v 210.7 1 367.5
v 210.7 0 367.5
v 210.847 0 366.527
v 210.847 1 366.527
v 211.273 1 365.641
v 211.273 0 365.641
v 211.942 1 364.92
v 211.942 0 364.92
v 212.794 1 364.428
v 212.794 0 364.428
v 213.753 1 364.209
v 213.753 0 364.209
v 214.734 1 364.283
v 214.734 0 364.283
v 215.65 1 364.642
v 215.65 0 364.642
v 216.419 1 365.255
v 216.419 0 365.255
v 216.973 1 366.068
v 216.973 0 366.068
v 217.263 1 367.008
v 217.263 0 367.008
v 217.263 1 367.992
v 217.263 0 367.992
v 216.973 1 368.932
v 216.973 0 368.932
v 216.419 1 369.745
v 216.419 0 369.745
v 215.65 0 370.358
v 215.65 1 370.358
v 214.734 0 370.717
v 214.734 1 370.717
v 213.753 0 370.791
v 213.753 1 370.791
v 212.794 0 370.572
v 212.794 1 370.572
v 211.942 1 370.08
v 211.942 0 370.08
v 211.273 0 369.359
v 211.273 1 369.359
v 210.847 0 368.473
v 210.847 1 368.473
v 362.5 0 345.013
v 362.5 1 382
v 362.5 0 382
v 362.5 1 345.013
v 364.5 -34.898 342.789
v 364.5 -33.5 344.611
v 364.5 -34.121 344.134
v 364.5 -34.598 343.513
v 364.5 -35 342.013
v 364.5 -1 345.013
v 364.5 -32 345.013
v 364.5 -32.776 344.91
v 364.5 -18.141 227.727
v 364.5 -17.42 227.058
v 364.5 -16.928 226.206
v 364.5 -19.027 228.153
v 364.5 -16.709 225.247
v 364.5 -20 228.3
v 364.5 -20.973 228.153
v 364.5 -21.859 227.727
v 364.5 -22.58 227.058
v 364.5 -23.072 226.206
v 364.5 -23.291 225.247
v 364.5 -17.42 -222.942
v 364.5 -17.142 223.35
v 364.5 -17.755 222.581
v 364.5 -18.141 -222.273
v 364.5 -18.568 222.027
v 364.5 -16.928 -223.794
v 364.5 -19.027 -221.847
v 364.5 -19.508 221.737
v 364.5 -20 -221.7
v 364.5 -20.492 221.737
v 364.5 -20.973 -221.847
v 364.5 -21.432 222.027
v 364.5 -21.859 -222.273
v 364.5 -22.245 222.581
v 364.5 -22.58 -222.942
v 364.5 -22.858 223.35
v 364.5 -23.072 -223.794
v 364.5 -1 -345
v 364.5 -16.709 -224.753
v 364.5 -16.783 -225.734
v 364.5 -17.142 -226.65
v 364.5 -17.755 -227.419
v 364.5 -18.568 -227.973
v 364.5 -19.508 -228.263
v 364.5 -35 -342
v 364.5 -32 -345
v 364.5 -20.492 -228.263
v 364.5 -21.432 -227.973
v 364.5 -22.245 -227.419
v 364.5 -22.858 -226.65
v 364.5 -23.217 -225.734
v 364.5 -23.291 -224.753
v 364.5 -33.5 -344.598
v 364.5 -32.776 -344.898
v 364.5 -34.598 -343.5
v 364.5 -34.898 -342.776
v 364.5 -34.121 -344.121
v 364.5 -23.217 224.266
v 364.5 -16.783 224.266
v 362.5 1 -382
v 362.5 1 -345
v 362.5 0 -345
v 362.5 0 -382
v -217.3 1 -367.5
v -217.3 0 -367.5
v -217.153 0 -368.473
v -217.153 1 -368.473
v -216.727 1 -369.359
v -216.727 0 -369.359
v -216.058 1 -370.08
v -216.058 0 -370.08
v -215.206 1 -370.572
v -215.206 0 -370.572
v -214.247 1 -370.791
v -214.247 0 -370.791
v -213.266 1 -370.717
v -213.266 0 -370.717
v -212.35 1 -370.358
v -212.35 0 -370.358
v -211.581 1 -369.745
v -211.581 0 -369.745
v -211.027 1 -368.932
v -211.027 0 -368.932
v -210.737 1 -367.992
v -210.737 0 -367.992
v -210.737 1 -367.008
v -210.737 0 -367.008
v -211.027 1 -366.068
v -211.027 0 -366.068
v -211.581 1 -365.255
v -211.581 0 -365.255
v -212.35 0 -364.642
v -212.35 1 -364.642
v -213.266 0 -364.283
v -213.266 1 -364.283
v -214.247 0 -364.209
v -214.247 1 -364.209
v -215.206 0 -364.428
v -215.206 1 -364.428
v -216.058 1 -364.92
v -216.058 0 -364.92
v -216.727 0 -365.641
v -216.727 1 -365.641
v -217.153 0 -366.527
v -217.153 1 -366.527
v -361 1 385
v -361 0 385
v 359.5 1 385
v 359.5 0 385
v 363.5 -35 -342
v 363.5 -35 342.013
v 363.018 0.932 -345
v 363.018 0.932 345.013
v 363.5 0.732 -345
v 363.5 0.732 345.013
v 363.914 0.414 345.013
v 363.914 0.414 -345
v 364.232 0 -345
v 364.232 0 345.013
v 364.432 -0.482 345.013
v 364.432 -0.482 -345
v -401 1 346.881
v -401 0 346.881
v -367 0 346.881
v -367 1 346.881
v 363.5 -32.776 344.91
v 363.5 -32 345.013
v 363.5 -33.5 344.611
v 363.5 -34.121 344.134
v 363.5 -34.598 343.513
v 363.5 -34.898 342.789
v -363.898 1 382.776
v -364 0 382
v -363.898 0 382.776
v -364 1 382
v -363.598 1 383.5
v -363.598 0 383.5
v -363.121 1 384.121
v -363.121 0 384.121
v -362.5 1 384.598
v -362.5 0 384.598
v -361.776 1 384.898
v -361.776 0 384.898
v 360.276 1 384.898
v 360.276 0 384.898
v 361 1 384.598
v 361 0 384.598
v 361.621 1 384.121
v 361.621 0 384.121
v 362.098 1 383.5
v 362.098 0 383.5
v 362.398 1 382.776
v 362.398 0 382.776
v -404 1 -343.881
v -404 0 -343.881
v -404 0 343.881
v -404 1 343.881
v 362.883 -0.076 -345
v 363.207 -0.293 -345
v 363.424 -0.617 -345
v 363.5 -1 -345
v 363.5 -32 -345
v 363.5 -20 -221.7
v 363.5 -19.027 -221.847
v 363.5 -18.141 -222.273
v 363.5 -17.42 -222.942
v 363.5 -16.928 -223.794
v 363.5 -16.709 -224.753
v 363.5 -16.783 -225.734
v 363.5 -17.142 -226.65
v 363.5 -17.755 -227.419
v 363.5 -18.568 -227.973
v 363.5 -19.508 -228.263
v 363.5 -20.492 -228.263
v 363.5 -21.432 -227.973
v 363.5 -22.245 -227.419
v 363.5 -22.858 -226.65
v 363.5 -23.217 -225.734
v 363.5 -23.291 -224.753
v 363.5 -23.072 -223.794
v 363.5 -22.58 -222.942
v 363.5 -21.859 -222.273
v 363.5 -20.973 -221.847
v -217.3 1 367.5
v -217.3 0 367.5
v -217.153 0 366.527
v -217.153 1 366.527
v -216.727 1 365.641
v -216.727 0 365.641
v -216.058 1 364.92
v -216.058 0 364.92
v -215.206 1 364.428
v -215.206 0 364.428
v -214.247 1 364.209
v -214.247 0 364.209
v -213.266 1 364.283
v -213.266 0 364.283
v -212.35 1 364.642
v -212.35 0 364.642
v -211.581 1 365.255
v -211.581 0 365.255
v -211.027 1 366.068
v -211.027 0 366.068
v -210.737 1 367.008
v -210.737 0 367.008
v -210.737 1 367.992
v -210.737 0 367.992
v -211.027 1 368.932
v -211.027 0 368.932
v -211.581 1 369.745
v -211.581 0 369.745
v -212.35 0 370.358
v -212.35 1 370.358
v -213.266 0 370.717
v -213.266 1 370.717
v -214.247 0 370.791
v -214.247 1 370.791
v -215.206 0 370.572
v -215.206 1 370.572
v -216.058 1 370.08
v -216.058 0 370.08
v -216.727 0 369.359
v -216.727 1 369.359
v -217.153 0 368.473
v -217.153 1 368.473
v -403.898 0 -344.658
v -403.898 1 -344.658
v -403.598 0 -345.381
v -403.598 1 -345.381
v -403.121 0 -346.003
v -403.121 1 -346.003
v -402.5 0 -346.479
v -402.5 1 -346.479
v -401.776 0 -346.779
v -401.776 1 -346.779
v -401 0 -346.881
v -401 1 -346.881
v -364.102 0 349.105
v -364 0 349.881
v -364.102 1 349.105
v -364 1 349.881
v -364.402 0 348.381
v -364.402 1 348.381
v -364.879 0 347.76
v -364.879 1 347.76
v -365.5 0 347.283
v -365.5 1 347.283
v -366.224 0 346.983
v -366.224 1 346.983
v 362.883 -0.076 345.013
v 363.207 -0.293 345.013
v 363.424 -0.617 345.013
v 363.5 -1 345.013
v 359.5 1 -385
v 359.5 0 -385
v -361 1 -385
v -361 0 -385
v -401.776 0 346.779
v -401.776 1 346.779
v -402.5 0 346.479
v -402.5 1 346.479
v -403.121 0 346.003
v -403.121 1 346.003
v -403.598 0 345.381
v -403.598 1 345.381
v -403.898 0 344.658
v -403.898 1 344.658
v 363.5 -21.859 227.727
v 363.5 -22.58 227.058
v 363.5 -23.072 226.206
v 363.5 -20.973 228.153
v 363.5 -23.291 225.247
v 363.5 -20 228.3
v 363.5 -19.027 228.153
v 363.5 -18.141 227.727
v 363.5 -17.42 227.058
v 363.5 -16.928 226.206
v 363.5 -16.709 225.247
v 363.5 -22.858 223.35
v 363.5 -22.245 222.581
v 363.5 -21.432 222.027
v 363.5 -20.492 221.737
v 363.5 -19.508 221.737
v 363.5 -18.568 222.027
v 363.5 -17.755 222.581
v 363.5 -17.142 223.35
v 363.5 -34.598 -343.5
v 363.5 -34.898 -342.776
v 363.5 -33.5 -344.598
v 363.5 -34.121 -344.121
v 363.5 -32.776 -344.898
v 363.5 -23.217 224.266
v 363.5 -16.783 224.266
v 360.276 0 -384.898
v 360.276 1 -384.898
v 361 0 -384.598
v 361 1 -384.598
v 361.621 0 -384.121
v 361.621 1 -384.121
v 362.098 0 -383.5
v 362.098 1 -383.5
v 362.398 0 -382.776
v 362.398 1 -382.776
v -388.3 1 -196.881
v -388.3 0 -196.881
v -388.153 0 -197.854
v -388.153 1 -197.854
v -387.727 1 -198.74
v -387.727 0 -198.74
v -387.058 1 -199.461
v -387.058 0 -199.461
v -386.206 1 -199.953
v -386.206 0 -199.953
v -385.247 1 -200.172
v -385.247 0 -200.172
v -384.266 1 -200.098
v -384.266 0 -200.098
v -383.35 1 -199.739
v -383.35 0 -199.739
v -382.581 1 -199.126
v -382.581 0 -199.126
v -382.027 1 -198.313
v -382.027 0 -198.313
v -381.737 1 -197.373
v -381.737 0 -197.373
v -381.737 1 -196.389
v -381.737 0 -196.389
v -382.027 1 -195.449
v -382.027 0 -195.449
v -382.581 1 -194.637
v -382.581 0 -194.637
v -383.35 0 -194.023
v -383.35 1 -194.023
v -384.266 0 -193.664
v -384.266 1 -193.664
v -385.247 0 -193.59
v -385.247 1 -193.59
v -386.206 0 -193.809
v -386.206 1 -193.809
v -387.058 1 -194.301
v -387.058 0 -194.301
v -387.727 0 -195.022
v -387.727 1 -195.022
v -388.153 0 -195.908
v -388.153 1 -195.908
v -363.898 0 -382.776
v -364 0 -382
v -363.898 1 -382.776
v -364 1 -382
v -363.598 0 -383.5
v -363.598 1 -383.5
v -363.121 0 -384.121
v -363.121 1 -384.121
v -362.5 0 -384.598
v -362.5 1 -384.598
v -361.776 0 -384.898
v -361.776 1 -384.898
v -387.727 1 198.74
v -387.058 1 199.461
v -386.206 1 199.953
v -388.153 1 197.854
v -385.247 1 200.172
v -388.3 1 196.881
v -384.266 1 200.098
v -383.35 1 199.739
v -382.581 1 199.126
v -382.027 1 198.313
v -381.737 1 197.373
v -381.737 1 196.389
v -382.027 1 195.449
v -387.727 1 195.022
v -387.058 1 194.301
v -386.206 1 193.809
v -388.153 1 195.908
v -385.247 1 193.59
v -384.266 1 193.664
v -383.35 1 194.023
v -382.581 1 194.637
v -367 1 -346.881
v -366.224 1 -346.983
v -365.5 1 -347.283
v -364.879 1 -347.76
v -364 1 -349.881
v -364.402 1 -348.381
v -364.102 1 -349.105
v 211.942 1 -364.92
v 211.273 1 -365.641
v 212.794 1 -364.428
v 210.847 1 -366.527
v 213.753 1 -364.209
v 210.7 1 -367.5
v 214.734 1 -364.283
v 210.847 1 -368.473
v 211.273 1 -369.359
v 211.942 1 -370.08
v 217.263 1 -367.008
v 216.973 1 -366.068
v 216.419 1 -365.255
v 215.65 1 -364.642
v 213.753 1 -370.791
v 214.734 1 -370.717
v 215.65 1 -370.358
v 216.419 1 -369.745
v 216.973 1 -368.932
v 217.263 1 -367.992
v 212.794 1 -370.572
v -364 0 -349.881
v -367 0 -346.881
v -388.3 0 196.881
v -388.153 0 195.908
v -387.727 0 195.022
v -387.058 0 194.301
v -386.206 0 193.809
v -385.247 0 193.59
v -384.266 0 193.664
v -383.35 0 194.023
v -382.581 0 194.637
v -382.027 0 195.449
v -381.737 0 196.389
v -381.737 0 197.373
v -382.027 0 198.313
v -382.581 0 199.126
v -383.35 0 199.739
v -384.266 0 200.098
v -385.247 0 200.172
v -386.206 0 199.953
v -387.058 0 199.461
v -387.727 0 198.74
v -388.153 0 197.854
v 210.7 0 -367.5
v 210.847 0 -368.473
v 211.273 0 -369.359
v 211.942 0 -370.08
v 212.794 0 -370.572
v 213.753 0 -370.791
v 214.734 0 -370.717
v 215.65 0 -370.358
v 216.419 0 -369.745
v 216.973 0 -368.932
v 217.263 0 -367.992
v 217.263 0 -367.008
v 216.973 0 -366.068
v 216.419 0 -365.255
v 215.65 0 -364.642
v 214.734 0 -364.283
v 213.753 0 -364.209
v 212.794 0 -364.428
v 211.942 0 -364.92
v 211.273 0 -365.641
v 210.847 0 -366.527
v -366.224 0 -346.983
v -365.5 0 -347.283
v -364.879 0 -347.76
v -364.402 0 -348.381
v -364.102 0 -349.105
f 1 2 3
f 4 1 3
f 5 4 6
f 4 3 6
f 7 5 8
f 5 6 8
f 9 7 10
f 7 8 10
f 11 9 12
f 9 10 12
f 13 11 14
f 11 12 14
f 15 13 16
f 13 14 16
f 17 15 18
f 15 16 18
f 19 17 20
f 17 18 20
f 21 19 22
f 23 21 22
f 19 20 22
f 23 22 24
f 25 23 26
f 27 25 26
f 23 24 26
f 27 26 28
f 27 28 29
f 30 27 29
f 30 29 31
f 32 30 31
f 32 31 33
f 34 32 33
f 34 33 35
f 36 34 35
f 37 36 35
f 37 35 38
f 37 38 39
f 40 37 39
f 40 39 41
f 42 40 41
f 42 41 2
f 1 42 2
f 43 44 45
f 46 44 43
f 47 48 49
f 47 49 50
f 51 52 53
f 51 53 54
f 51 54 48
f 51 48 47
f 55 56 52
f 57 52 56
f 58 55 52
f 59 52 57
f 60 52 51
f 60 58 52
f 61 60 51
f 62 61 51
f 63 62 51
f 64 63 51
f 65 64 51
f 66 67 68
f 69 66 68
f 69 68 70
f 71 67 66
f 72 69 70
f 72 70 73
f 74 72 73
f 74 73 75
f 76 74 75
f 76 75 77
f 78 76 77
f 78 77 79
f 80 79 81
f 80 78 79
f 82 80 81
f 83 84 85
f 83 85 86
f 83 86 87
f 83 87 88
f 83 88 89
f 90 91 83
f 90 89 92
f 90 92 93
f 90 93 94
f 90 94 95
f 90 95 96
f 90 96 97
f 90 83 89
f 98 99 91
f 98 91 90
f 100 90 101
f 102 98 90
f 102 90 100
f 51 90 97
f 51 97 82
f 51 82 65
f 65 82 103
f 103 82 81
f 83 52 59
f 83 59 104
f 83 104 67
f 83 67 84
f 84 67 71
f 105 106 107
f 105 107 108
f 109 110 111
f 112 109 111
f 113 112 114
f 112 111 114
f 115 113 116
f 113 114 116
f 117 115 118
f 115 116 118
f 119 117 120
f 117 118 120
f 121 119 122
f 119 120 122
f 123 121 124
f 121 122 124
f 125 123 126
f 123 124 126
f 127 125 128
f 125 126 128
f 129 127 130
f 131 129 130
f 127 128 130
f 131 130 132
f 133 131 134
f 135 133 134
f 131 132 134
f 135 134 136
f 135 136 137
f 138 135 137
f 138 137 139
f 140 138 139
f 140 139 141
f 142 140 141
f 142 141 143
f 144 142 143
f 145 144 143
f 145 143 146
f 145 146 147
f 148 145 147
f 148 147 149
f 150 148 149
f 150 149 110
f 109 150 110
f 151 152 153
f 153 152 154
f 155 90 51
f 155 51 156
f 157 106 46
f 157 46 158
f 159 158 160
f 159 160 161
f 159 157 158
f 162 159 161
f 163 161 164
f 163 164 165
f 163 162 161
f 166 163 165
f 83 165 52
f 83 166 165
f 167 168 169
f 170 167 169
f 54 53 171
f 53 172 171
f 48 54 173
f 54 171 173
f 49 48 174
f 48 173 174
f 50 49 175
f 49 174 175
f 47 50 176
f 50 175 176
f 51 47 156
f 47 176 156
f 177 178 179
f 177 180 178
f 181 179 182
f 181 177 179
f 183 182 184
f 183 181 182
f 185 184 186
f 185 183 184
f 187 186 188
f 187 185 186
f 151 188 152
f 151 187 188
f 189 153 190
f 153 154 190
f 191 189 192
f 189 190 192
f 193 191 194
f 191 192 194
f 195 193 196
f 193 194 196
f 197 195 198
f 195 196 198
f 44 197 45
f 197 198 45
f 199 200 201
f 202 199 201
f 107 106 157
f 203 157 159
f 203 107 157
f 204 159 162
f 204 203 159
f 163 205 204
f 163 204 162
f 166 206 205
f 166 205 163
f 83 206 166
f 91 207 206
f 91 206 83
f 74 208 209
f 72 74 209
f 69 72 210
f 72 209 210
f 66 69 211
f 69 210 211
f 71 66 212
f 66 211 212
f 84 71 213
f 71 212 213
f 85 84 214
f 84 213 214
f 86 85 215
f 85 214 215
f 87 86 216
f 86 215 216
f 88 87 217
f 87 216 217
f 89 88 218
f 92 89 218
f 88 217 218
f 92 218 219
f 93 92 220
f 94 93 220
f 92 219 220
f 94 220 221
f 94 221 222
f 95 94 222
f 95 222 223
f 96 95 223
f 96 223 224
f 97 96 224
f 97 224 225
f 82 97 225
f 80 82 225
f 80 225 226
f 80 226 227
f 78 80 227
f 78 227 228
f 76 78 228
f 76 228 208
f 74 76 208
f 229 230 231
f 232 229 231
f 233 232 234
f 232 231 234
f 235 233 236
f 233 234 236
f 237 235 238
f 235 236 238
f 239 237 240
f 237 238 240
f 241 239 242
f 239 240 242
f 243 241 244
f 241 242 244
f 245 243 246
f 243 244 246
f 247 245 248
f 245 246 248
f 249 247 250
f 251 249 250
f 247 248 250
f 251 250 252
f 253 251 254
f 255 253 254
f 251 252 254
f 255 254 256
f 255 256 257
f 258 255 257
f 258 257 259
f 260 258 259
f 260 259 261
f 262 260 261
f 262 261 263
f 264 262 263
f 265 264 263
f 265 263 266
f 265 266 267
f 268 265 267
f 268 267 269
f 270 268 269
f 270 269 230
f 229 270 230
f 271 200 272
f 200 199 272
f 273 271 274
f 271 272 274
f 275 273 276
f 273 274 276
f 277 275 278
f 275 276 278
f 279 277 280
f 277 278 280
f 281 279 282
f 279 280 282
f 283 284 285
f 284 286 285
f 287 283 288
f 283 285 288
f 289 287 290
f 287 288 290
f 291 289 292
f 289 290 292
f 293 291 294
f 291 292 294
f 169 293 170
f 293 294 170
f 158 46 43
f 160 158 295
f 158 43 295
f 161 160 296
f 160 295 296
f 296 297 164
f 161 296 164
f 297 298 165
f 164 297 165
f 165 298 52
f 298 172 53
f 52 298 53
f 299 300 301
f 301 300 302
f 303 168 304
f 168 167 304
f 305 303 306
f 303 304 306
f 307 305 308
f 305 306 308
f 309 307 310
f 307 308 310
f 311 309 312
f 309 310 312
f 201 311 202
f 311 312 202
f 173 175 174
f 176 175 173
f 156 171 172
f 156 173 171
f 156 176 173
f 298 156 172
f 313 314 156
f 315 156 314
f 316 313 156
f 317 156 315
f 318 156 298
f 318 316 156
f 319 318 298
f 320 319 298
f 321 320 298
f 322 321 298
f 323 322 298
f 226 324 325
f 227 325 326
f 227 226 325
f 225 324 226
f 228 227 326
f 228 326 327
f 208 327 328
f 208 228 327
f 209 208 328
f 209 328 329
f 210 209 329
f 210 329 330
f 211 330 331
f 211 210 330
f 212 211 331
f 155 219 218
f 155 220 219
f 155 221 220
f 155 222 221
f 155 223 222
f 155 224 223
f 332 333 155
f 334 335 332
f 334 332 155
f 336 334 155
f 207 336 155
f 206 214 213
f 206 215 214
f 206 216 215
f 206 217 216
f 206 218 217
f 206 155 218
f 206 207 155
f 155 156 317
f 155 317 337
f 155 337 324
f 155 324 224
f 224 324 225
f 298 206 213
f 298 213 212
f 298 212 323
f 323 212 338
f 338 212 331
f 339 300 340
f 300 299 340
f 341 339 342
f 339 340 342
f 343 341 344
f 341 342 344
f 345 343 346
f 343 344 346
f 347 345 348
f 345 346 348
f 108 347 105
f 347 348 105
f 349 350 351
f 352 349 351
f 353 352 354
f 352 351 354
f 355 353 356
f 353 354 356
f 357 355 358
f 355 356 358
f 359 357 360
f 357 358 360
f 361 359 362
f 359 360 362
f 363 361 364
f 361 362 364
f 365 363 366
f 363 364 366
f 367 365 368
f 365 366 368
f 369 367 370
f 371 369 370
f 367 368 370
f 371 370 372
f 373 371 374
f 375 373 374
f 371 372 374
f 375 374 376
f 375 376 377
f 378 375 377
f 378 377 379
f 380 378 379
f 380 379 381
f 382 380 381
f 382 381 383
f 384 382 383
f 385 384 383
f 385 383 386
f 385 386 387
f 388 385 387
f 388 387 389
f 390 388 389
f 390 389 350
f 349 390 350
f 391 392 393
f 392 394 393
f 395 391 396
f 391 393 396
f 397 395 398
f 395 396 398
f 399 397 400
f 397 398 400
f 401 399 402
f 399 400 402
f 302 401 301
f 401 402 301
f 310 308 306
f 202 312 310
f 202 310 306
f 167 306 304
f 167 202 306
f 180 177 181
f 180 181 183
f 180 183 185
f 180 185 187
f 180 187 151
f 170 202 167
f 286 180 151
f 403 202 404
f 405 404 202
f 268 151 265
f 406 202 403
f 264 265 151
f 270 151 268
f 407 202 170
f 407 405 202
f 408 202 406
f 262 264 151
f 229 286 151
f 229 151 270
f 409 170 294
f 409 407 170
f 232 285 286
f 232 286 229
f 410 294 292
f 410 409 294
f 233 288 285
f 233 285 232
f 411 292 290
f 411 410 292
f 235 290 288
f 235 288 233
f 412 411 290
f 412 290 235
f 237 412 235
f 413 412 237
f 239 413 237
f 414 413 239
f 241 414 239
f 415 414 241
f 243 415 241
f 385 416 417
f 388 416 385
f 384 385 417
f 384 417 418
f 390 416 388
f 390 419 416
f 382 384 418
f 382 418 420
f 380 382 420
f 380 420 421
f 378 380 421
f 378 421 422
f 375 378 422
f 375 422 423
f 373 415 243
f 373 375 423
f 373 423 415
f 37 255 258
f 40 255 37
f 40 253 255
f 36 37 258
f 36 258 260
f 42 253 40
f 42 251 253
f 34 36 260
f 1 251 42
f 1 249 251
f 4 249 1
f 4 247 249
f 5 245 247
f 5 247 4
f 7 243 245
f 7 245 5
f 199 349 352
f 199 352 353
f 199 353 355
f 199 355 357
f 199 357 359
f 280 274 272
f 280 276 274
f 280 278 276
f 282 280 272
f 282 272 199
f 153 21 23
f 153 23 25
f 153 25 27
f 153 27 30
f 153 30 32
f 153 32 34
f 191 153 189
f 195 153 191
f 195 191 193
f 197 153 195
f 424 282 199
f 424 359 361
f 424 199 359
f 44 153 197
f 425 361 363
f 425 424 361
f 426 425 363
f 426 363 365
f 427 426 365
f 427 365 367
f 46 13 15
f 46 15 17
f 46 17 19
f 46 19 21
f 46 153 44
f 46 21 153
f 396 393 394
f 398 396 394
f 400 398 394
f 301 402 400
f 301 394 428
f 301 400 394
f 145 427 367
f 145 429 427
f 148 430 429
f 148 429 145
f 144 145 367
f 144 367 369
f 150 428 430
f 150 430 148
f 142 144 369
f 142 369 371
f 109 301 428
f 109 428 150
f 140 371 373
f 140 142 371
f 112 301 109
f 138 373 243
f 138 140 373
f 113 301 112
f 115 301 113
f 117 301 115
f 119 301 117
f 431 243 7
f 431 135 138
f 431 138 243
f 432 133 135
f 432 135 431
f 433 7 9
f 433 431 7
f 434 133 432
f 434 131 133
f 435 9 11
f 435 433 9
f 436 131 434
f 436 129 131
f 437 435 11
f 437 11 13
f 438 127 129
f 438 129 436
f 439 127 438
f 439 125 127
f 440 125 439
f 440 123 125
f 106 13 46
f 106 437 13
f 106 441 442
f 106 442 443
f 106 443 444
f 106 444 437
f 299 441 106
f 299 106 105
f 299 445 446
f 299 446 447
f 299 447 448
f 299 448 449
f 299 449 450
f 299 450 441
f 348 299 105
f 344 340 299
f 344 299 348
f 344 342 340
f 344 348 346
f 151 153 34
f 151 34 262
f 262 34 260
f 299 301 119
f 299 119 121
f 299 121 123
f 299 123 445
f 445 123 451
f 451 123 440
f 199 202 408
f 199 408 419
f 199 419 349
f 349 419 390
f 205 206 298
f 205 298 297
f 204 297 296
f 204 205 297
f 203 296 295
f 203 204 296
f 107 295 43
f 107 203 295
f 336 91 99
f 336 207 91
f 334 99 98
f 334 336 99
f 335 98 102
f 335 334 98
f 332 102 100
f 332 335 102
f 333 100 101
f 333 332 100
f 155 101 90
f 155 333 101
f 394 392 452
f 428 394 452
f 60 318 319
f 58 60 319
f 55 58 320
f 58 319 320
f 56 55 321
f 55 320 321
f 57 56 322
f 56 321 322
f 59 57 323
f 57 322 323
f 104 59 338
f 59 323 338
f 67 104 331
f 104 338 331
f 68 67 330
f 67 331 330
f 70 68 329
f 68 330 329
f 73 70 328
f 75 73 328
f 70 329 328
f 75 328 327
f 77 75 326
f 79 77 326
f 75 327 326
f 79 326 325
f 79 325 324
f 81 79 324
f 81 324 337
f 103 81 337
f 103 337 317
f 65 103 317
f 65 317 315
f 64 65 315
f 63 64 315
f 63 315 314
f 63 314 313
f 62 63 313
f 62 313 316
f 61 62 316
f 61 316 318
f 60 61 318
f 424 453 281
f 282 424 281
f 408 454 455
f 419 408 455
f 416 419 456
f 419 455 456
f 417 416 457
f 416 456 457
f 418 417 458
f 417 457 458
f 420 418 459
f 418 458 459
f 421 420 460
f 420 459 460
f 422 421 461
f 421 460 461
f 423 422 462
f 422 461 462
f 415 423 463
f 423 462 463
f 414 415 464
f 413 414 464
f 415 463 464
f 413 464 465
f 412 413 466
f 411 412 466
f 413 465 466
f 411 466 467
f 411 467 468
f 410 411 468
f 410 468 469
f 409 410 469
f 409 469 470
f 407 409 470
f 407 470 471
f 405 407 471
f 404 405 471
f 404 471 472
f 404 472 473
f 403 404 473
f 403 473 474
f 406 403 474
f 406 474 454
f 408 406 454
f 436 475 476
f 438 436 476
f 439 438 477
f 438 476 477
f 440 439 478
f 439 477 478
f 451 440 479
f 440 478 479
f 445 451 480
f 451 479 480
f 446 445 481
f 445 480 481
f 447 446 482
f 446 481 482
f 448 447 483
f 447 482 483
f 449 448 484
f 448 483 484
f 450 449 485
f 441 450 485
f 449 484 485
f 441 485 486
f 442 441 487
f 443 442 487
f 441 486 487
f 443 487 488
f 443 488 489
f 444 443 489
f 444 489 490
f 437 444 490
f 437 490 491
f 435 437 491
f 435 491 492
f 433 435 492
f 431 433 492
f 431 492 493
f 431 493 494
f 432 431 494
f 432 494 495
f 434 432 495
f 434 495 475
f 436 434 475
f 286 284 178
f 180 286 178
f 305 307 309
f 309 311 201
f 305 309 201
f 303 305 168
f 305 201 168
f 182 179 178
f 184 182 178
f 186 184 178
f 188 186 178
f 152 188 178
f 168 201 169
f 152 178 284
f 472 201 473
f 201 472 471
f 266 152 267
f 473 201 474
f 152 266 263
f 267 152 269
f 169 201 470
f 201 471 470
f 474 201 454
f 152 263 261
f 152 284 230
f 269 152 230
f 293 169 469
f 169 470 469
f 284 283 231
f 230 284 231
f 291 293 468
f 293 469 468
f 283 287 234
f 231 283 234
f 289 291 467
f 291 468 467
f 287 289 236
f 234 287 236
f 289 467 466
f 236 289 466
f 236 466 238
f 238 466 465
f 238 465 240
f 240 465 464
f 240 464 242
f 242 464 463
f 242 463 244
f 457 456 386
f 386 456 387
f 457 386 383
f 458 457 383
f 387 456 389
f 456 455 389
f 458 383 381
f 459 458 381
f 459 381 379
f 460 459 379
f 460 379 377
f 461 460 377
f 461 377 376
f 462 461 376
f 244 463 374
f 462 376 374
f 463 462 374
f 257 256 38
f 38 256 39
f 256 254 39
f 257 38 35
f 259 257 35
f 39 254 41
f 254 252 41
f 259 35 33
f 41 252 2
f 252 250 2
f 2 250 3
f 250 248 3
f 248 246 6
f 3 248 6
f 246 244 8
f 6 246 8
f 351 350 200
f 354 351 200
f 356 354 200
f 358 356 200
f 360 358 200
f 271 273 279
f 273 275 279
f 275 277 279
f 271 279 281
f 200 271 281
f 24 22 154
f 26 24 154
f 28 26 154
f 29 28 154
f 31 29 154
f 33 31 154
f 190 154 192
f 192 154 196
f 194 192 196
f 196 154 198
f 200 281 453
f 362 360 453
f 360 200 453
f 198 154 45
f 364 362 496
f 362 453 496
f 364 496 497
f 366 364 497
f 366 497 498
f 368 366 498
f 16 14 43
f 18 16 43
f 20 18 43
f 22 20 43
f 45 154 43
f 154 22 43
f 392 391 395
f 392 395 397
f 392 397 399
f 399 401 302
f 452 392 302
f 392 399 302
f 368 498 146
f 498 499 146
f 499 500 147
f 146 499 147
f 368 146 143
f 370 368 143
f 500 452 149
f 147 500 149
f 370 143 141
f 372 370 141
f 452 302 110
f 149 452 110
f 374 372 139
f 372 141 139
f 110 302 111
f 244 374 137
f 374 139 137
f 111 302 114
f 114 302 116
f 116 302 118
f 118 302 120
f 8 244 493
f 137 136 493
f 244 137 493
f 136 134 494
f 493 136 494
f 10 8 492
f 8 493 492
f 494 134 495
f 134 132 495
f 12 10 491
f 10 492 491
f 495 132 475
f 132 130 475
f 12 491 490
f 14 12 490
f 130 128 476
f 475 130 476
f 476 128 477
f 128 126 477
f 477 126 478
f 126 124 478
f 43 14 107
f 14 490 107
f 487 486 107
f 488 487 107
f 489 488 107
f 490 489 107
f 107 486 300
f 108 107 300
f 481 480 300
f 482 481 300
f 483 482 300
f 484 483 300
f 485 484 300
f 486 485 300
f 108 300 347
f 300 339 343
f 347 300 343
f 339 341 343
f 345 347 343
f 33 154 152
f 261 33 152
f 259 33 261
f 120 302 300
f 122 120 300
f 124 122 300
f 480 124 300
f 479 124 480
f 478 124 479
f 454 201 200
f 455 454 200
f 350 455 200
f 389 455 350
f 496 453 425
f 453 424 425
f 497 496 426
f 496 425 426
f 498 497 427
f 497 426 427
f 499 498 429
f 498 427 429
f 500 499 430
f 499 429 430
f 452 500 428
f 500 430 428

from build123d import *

# Parameters (mm, degrees)
BOSS_EXTRUDE1_DEPTH  = 1
M6_CLEARANCE_HOLE1_D = 6.6
SKETCH8_W            = 41.5
SKETCH8_H            = 838.415827604
CUT_EXTRUDE1_DEPTH   = 10
EDGE_FLANGE1_DEPTH   = 690.012501954
FILLET1_R            = 3
M6_CLEARANCE_HOLE2_D = 6.6


# Sheet-metal steps are written as plain solids
with BuildPart() as part:
    # Sketch1 → Boss-Extrude1 (new body)
    with BuildSketch(Plane(origin=(0, 0, 0), x_dir=(1, 0, 0), z_dir=(0, 1, 0))):
        Polygon((-364, -346.881188119), (-364, -385), (364, -385), (364, -346.881188119), (404, -346.881188119), (404, 346.881188119), (364, 346.881188119), (364, 385), (-364, 385), (-364, 346.881188119), (-404, 346.881188119), (-404, -346.881188119), align=None)
    extrude(amount=BOSS_EXTRUDE1_DEPTH)

    # M6 Clearance Hole1 (through all)
    with Locations(Plane(origin=(0, 1, 0), x_dir=(1, 0, 0), z_dir=(0, 1, 0))):
        with Locations((-214, -367.5), (-385, -196.881188119), (-385, 196.881188119), (-214, 367.5), (214, 367.5), (214, -367.5), (385, -286.881188119), (385, -86.881188119)):
            Hole(M6_CLEARANCE_HOLE1_D / 2)

    # Sketch8 → Cut-Extrude1 (cut)
    with BuildSketch(Plane(origin=(0, 1, 0), x_dir=(1, 0, 0), z_dir=(0, 1, 0))):
        with Locations((383.25, -15.625663738)):
            Rectangle(SKETCH8_W, SKETCH8_H)
    extrude(amount=-CUT_EXTRUDE1_DEPTH, mode=Mode.SUBTRACT)

    # Edge-Flange1 section (across the edge) → Edge-Flange1 (add)
    with BuildSketch(Plane(origin=(363.5, 0, -345), x_dir=(-1, 0, 0), z_dir=(0, 0, 1))):
        with BuildLine():
            Line((-1, 1), (-1, 35))
            Line((-1, 35), (0, 35))
            Line((0, 35), (0, 1))
            ThreePointArc((0, 1), (0.292893219, 0.292893219), (1, 0))
            Line((1, 0), (1, -1))
            ThreePointArc((1, -1), (-0.414213562, -0.414213562), (-1, 1))
        make_face()
    extrude(amount=EDGE_FLANGE1_DEPTH)

    # Fillet1
    fillet1_edges = [part.edges().sort_by_distance(p)[0] for p in [
        (364, -35, -345),
        (364, -35, 345.012501954),
        (-364, 0.5, 385),
        (-364, 0.5, 346.881188119),
        (-404, 0.5, 346.881188119),
        (-404, 0.5, -346.881188119),
        (-364, 0.5, -346.881188119),
        (-364, 0.5, -385),
        (362.5, 0.5, -385),
        (362.5, 0.5, 385),
    ]]
    fillet(fillet1_edges, radius=FILLET1_R)

    # M6 Clearance Hole2 (through all)
    with Locations(Plane(origin=(364.5, 0, 0), x_dir=(0, 0, -1), z_dir=(1, 0, 0))):
        with Locations((-225, -20), (225, -20)):
            Hole(M6_CLEARANCE_HOLE2_D / 2)


solid = part.part
